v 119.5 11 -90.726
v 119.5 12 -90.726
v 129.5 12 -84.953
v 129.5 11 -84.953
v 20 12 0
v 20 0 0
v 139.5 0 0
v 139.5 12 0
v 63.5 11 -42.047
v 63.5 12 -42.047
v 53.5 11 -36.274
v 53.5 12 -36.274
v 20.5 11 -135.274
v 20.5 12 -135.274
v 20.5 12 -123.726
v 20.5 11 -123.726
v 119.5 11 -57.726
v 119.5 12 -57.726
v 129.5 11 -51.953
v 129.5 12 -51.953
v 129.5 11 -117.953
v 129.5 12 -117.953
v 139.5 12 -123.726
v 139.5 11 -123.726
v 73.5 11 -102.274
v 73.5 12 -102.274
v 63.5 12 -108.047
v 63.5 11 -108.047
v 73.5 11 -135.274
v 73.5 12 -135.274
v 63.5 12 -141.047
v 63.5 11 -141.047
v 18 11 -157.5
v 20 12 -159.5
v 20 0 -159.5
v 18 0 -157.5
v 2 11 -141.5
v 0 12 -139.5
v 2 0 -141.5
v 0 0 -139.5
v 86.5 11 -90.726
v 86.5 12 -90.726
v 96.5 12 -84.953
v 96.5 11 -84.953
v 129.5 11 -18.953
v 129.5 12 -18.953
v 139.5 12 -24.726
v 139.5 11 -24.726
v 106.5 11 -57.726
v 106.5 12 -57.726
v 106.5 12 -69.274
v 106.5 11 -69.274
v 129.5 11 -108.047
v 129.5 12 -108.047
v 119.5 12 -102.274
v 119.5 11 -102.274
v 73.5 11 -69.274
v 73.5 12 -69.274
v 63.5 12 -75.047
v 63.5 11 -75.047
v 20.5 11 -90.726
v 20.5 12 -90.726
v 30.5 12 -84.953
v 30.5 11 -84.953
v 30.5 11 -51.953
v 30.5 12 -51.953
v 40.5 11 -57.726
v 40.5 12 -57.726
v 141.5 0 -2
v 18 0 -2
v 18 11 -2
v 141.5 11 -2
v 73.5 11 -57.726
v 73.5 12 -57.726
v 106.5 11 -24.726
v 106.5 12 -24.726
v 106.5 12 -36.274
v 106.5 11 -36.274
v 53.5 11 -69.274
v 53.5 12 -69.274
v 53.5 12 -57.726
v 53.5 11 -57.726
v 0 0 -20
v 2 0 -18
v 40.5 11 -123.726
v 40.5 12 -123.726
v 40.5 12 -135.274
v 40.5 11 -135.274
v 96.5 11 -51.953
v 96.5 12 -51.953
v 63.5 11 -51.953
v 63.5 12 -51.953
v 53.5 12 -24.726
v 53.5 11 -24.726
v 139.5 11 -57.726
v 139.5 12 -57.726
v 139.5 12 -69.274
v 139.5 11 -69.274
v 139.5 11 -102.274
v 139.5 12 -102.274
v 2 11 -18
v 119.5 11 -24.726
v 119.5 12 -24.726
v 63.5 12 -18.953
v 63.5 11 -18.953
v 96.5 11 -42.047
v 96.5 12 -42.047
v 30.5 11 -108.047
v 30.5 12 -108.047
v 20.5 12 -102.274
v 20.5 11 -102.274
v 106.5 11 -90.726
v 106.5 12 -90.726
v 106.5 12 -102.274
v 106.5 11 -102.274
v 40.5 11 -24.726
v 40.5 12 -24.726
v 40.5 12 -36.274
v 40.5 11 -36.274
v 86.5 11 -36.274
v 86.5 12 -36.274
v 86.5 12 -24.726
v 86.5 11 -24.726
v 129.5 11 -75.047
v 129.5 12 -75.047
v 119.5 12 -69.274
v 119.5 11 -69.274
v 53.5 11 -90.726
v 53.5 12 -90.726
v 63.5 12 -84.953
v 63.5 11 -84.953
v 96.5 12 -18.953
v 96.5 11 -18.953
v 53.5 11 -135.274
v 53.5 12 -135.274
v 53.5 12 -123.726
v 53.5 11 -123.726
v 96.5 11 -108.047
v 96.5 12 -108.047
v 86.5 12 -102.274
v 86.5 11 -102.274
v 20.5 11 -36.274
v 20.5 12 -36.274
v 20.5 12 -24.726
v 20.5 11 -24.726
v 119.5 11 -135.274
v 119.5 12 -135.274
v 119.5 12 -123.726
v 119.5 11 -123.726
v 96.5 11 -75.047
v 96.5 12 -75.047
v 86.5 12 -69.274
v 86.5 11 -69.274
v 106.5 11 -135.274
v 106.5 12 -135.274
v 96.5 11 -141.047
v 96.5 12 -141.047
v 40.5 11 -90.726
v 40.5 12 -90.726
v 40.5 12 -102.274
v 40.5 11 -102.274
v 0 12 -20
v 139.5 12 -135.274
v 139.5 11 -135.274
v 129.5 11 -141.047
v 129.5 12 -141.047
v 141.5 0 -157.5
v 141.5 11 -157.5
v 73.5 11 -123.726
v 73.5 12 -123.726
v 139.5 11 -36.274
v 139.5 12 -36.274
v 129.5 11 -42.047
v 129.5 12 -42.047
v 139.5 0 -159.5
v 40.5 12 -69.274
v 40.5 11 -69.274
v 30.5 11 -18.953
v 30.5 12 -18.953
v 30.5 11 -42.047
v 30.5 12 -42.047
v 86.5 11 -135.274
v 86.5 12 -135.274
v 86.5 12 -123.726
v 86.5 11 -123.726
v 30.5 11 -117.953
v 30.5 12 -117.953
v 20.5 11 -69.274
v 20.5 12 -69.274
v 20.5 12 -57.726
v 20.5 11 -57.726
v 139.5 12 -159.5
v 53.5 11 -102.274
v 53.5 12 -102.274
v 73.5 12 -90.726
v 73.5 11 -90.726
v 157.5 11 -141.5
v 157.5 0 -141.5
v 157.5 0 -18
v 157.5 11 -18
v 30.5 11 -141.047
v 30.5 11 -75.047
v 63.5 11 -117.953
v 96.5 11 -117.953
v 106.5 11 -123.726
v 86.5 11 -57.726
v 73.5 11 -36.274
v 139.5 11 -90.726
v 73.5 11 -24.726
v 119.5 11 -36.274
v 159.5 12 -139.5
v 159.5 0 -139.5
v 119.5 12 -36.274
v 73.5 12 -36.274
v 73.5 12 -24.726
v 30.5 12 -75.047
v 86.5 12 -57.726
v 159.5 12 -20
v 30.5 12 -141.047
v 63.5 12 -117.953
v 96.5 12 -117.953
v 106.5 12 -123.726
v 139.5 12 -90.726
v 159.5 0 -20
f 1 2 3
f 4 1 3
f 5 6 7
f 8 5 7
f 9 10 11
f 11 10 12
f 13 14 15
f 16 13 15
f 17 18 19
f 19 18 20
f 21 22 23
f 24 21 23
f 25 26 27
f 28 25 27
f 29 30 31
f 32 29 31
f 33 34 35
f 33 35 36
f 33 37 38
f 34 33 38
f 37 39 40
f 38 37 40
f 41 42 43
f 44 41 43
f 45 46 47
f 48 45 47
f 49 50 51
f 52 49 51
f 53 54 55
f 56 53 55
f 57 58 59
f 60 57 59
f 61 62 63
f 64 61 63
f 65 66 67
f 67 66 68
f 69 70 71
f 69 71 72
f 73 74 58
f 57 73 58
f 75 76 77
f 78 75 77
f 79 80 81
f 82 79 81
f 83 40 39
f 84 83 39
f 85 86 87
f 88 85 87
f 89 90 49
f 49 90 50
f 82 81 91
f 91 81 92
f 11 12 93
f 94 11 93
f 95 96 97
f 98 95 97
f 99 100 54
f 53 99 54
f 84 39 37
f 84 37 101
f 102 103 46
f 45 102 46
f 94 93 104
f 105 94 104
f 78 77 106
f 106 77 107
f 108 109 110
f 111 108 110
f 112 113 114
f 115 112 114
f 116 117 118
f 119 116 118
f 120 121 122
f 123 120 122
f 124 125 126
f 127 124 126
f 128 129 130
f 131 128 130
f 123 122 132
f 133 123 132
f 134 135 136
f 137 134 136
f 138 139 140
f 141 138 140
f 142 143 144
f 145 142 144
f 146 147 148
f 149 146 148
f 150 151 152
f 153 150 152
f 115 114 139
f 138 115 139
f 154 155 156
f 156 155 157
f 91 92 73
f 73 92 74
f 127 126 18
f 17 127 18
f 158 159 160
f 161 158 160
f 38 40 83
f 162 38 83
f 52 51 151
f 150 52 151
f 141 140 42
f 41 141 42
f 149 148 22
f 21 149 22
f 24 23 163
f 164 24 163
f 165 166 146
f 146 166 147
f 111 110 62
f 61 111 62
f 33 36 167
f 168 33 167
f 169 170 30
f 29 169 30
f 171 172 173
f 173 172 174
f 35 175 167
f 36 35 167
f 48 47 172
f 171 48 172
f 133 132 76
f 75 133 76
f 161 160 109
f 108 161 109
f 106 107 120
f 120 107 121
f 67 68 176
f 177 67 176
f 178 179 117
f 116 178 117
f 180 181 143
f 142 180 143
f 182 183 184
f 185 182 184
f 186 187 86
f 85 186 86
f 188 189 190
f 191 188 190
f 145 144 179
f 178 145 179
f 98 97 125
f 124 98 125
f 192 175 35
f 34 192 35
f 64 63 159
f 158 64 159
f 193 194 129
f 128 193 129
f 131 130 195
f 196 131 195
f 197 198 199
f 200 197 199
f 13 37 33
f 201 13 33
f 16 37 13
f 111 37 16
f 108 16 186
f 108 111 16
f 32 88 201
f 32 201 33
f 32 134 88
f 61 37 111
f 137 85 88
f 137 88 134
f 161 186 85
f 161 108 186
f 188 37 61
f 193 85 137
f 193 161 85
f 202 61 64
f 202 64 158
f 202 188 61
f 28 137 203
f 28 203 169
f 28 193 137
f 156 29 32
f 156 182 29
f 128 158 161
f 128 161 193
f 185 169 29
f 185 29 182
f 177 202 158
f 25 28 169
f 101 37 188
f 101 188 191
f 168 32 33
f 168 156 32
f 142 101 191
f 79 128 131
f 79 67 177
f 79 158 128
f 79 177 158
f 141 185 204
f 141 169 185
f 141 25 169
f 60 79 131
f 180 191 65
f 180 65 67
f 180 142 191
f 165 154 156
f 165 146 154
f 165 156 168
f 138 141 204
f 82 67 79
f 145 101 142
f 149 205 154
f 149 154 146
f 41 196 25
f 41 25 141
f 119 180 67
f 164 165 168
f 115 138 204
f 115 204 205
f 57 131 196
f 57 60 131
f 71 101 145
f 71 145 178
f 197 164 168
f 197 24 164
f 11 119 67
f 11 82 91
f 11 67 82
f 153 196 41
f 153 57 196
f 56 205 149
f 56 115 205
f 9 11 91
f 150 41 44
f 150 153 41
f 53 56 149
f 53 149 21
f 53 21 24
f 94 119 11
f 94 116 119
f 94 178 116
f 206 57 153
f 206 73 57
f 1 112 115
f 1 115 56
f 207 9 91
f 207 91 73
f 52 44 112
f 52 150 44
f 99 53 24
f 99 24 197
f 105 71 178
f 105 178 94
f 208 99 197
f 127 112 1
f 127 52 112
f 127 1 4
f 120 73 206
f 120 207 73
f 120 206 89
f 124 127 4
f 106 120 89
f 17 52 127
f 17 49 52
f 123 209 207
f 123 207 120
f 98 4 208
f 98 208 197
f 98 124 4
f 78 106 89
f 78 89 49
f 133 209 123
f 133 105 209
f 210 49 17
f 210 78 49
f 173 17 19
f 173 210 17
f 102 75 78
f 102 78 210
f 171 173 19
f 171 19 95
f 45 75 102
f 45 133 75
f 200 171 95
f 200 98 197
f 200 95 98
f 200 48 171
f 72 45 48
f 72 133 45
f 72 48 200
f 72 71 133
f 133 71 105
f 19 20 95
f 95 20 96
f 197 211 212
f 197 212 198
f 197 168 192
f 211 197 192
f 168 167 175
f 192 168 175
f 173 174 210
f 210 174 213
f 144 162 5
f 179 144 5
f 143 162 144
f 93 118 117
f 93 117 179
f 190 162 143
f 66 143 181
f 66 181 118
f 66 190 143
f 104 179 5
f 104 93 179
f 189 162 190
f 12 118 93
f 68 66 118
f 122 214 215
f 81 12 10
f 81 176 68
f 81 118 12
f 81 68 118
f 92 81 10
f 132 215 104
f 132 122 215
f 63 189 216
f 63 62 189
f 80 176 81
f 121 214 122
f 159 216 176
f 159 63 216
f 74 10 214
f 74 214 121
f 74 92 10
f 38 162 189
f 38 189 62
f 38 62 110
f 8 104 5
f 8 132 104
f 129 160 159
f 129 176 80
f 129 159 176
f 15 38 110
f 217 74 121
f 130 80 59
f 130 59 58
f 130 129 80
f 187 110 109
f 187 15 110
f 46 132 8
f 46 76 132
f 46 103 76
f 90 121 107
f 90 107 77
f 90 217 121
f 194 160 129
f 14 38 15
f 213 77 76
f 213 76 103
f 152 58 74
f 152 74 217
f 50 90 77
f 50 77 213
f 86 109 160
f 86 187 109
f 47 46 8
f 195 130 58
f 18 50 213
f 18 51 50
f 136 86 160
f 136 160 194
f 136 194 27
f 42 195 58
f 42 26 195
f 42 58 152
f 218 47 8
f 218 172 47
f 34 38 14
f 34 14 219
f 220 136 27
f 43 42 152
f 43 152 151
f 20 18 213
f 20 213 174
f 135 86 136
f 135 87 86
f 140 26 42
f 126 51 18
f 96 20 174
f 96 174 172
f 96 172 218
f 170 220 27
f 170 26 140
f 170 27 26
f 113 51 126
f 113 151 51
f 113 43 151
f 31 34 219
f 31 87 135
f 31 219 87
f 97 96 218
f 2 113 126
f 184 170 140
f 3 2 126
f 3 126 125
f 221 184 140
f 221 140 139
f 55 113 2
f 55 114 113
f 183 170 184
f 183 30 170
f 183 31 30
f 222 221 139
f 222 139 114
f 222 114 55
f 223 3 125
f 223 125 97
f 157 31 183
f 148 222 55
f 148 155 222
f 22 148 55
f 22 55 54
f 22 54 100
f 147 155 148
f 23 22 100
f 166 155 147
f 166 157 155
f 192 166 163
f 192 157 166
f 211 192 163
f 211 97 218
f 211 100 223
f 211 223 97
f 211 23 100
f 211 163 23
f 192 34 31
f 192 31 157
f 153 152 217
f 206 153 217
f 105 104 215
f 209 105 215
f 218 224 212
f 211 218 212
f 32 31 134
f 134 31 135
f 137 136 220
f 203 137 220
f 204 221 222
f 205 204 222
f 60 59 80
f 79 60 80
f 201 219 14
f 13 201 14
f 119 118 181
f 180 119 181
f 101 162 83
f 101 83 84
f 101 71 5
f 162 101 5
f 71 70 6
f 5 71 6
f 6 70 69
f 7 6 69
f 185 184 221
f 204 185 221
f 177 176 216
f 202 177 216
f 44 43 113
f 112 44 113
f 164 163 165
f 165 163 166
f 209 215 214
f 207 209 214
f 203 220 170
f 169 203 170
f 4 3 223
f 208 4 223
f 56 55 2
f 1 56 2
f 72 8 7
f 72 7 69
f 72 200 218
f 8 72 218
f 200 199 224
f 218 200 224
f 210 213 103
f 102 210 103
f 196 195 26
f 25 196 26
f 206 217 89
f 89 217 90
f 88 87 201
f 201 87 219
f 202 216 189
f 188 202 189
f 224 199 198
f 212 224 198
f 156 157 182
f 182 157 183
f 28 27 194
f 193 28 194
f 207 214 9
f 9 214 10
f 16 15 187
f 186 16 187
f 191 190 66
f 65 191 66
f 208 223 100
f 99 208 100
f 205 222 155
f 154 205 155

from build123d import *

# Parameters (mm, degrees)
BOSS_EXTRUDE1_DEPTH = 12
SKETCH5_W           = 155.5
SKETCH5_H           = 155.5
CUT_EXTRUDE3_DEPTH  = 11
CUT_EXTRUDE4_DEPTH  = 11


with BuildPart() as part:
    # Sketch1 → Boss-Extrude1 (new body)
    with BuildSketch(Plane(origin=(0, 0, 0), x_dir=(1, 0, 0), z_dir=(0, 1, 0))):
        Polygon((20, 159.5), (0, 139.5), (0, 20), (20, 0), (139.5, 0), (159.5, 20), (159.5, 139.5), (139.5, 159.5), align=None)
    extrude(amount=BOSS_EXTRUDE1_DEPTH)

    # Sketch5 → Cut-Extrude3 (cut)
    with BuildSketch(Plane.XZ):
        with Locations((79.75, -79.75)):
            Rectangle(SKETCH5_W, SKETCH5_H)
    extrude(amount=-CUT_EXTRUDE3_DEPTH, mode=Mode.SUBTRACT)

    # Sketch7 → Cut-Extrude4 (cut)
    with BuildSketch(Plane(origin=(0, 12, 0), x_dir=(1, 0, 0), z_dir=(0, 1, 0))):
        Polygon((139.5, 123.726497308), (139.5, 135.273502692), (129.5, 141.047005384), (119.5, 135.273502692), (119.5, 123.726497308), (129.5, 117.952994616), align=None)
        Polygon((106.5, 123.726497308), (106.5, 135.273502692), (96.5, 141.047005384), (86.5, 135.273502692), (86.5, 123.726497308), (96.5, 117.952994616), align=None)
        Polygon((73.5, 123.726497308), (73.5, 135.273502692), (63.5, 141.047005384), (53.5, 135.273502692), (53.5, 123.726497308), (63.5, 117.952994616), align=None)
        Polygon((40.5, 123.726497308), (40.5, 135.273502692), (30.5, 141.047005384), (20.5, 135.273502692), (20.5, 123.726497308), (30.5, 117.952994616), align=None)
        Polygon((106.5, 90.726497308), (106.5, 102.273502692), (96.5, 108.047005384), (86.5, 102.273502692), (86.5, 90.726497308), (96.5, 84.952994616), align=None)
        Polygon((73.5, 90.726497308), (73.5, 102.273502692), (63.5, 108.047005384), (53.5, 102.273502692), (53.5, 90.726497308), (63.5, 84.952994616), align=None)
        Polygon((40.5, 90.726497308), (40.5, 102.273502692), (30.5, 108.047005384), (20.5, 102.273502692), (20.5, 90.726497308), (30.5, 84.952994616), align=None)
        Polygon((106.5, 57.726497308), (106.5, 69.273502692), (96.5, 75.047005384), (86.5, 69.273502692), (86.5, 57.726497308), (96.5, 51.952994616), align=None)
        Polygon((73.5, 57.726497308), (73.5, 69.273502692), (63.5, 75.047005384), (53.5, 69.273502692), (53.5, 57.726497308), (63.5, 51.952994616), align=None)
        Polygon((40.5, 57.726497308), (40.5, 69.273502692), (30.5, 75.047005384), (20.5, 69.273502692), (20.5, 57.726497308), (30.5, 51.952994616), align=None)
        Polygon((106.5, 24.726497308), (106.5, 36.273502692), (96.5, 42.047005384), (86.5, 36.273502692), (86.5, 24.726497308), (96.5, 18.952994616), align=None)
        Polygon((73.5, 24.726497308), (73.5, 36.273502692), (63.5, 42.047005384), (53.5, 36.273502692), (53.5, 24.726497308), (63.5, 18.952994616), align=None)
        Polygon((40.5, 24.726497308), (40.5, 36.273502692), (30.5, 42.047005384), (20.5, 36.273502692), (20.5, 24.726497308), (30.5, 18.952994616), align=None)
        Polygon((139.5, 90.726497308), (139.5, 102.273502692), (129.5, 108.047005384), (119.5, 102.273502692), (119.5, 90.726497308), (129.5, 84.952994616), align=None)
        Polygon((139.5, 57.726497308), (139.5, 69.273502692), (129.5, 75.047005384), (119.5, 69.273502692), (119.5, 57.726497308), (129.5, 51.952994616), align=None)
        Polygon((139.5, 24.726497308), (139.5, 36.273502692), (129.5, 42.047005384), (119.5, 36.273502692), (119.5, 24.726497308), (129.5, 18.952994616), align=None)
    extrude(amount=-CUT_EXTRUDE4_DEPTH, mode=Mode.SUBTRACT)


solid = part.part
